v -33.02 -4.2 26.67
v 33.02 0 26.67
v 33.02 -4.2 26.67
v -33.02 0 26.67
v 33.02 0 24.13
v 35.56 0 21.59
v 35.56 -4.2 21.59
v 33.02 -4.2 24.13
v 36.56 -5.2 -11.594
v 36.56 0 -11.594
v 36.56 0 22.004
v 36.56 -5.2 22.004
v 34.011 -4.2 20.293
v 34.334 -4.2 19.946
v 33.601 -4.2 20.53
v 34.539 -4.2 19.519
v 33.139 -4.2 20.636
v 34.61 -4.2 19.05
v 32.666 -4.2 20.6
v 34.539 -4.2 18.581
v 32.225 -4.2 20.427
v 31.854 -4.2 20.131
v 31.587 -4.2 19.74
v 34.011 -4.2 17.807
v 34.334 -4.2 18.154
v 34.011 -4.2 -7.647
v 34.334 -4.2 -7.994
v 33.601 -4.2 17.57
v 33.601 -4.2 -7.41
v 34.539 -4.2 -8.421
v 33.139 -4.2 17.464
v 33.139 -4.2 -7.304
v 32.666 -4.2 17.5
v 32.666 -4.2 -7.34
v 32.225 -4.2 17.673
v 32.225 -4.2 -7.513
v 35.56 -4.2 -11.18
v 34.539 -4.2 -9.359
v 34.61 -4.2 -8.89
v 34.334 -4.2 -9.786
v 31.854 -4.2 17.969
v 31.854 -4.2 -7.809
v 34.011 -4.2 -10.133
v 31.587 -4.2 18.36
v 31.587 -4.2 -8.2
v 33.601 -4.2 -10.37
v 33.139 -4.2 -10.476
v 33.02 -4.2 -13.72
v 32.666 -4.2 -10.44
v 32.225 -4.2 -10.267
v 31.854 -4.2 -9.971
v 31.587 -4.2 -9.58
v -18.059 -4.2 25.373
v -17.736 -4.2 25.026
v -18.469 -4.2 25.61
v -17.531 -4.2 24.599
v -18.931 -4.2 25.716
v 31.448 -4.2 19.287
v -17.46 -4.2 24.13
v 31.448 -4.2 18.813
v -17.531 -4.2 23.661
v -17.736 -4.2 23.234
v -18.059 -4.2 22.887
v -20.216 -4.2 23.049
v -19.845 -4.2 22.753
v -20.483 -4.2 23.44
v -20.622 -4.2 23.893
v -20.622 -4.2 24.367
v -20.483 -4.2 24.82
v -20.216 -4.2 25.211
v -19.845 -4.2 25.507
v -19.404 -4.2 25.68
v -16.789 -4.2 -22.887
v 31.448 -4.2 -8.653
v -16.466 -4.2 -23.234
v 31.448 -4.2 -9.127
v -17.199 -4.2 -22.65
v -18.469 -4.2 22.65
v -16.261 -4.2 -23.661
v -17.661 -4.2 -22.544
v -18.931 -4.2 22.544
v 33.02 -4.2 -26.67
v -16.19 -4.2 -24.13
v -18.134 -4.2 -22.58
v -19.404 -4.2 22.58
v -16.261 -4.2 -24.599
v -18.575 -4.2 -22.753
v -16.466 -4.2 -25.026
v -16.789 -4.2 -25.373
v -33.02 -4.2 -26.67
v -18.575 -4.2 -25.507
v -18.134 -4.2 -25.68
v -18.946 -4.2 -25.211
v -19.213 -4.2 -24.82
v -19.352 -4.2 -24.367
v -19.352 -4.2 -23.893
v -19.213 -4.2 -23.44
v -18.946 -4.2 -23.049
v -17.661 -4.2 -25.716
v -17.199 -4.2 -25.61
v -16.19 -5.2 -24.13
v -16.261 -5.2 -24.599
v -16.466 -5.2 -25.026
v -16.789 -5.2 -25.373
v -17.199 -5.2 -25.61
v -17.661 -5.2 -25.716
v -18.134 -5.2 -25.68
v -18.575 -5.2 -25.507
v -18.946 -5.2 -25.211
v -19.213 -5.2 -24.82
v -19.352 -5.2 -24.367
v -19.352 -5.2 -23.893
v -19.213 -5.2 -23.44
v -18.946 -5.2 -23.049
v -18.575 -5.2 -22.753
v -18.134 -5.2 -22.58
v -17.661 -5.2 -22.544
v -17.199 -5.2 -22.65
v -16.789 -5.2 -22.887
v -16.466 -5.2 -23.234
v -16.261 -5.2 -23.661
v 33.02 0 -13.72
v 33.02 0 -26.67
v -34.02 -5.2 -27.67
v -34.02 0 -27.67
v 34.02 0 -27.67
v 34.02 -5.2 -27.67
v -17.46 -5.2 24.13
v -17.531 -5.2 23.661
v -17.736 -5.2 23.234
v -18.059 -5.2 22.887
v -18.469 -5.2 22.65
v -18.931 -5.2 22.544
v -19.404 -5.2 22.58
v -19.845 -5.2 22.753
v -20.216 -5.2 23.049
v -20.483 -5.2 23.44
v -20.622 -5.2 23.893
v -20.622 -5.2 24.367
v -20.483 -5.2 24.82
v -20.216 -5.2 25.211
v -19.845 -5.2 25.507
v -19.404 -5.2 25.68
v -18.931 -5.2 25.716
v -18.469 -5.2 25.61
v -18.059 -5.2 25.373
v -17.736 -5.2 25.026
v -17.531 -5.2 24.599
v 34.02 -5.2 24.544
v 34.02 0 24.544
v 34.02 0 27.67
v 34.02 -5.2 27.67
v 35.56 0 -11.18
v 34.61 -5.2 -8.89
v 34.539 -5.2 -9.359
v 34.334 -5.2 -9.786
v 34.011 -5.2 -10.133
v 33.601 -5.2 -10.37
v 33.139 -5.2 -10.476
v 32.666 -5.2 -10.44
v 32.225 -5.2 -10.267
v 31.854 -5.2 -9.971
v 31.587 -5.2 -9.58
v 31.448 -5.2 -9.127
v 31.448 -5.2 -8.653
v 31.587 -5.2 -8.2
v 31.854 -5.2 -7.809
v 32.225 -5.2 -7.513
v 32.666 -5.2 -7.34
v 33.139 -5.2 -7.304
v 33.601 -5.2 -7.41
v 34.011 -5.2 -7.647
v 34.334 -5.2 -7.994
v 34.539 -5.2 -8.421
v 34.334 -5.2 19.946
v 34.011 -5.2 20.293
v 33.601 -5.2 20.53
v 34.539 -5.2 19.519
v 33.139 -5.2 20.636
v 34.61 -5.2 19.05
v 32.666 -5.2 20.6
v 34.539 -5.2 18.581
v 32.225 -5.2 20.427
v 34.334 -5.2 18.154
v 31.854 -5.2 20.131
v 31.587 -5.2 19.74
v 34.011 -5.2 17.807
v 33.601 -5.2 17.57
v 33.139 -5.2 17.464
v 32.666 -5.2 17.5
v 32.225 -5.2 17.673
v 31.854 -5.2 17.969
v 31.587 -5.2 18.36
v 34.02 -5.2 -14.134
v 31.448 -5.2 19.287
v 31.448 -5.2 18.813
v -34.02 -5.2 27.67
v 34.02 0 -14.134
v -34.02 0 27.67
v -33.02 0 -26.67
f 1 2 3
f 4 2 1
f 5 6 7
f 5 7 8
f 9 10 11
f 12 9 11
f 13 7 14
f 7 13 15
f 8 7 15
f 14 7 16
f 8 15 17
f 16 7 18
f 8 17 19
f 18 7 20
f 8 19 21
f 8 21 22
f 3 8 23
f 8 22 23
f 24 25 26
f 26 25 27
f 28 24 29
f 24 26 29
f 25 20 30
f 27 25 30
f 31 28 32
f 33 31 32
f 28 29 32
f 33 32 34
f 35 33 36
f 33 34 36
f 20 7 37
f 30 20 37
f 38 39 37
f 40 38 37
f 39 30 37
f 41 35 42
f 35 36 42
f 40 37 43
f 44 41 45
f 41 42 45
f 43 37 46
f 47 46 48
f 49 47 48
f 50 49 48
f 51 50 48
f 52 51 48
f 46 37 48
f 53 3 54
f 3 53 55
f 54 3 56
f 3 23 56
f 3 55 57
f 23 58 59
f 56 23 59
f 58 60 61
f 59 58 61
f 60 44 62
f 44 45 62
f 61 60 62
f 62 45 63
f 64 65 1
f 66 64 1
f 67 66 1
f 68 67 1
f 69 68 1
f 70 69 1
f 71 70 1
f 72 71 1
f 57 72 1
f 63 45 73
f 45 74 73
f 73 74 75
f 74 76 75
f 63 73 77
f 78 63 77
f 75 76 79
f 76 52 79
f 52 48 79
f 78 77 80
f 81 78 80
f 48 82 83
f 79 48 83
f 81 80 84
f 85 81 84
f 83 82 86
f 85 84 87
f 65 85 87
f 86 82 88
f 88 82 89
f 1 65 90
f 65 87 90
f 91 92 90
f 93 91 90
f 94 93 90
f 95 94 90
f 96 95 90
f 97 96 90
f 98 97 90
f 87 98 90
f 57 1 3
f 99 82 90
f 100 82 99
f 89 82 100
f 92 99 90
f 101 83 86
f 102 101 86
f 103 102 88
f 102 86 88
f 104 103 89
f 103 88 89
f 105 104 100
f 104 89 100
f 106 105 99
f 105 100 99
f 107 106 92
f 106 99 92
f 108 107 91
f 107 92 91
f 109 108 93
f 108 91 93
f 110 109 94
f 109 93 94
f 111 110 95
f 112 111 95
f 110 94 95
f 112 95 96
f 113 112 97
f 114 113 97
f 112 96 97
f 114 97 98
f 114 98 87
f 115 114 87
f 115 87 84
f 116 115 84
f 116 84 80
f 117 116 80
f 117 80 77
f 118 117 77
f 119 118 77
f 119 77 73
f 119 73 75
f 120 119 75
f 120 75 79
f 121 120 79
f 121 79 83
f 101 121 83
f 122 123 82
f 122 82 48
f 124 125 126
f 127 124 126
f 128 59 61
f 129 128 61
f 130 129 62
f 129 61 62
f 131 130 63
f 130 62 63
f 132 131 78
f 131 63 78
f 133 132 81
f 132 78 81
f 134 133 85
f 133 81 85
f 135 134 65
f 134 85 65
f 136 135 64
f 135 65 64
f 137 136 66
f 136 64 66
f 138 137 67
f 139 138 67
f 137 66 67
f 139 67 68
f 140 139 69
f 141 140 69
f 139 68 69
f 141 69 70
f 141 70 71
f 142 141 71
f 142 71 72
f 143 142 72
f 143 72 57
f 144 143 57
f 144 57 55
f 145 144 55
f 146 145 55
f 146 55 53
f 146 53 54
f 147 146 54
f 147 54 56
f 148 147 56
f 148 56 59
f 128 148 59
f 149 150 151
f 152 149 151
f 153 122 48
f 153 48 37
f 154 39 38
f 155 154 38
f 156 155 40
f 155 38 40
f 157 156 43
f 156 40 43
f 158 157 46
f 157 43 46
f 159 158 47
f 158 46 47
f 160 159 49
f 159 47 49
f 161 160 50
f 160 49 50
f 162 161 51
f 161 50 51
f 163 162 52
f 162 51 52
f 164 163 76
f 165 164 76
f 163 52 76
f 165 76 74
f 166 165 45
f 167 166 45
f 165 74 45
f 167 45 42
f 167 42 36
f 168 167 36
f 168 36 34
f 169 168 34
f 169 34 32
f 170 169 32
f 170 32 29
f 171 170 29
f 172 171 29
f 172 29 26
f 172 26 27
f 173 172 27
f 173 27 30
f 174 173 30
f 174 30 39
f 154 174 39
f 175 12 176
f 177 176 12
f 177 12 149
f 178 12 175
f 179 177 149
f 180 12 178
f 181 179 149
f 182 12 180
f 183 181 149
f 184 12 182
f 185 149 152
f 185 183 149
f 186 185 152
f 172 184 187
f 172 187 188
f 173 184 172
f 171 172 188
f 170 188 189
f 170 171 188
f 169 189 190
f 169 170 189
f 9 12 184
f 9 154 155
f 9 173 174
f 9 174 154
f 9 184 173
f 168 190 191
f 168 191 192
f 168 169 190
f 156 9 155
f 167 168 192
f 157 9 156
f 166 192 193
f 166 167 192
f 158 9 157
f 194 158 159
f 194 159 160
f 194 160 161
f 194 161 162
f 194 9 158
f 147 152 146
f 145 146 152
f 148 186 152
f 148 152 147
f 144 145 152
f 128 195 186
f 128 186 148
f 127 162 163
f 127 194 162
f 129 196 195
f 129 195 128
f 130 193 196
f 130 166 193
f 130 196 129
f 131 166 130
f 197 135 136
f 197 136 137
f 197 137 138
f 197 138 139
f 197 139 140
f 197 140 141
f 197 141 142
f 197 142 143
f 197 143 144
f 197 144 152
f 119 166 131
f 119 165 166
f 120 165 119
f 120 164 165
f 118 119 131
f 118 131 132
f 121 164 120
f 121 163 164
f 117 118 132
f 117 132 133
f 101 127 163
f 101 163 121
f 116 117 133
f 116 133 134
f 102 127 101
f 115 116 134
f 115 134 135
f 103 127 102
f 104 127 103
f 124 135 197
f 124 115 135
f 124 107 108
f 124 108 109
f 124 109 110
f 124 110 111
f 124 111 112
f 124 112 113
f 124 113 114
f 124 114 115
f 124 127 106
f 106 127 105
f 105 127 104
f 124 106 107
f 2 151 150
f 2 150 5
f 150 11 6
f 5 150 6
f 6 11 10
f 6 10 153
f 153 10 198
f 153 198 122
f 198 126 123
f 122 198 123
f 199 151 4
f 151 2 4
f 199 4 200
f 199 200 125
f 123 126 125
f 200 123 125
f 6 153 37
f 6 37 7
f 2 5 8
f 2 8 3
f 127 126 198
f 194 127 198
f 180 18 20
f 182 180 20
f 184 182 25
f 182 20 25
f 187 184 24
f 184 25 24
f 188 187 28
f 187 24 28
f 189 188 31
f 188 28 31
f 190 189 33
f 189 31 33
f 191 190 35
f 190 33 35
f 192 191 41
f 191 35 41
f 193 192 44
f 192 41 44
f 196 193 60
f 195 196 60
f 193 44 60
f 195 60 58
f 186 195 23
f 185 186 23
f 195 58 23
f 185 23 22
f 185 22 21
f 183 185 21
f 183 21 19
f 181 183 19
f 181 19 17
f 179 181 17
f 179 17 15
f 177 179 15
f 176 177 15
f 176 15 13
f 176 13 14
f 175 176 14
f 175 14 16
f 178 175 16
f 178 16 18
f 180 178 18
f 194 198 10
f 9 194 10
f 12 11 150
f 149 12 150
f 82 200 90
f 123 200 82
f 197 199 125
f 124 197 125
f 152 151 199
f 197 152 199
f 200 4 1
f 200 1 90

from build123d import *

# Parameters (mm, degrees)
SKETCH1_R           = 1.59
BOSS_EXTRUDE1_DEPTH = 5.2
SKETCH1_5_R         = 1.59
CUT_EXTRUDE2_DEPTH  = 4.2


with BuildPart() as part:
    # Sketch1 → Boss-Extrude1 (new body)
    with BuildSketch(Plane(origin=(0, 0, 0), x_dir=(1, 0, 0), z_dir=(0, 1, 0))):
        Polygon((36.56, 11.594213562), (34.02, 14.134213562), (34.02, 27.67), (-34.02, 27.67), (-34.02, -27.67), (34.02, -27.67), (34.02, -24.544213562), (36.56, -22.004213562), align=None)
        with Locations((-19.05, -24.13)):
            Circle(SKETCH1_R, mode=Mode.SUBTRACT)
        with Locations((33.02, -19.05)):
            Circle(SKETCH1_R, mode=Mode.SUBTRACT)
        with Locations((-17.78, 24.13)):
            Circle(SKETCH1_R, mode=Mode.SUBTRACT)
        with Locations((33.02, 8.89)):
            Circle(SKETCH1_R, mode=Mode.SUBTRACT)
    extrude(amount=-BOSS_EXTRUDE1_DEPTH)

    # Sketch1<5> → Cut-Extrude2 (cut)
    with BuildSketch(Plane(origin=(0, 0, 0), x_dir=(1, 0, 0), z_dir=(0, 1, 0))):
        Polygon((-33.02, -26.67), (33.02, -26.67), (33.02, -24.13), (35.56, -21.59), (35.56, 11.18), (33.02, 13.72), (33.02, 26.67), (-33.02, 26.67), align=None)
        with Locations((-19.05, -24.13)):
            Circle(SKETCH1_5_R, mode=Mode.SUBTRACT)
        with Locations((33.02, -19.05)):
            Circle(SKETCH1_5_R, mode=Mode.SUBTRACT)
        with Locations((-17.78, 24.13)):
            Circle(SKETCH1_5_R, mode=Mode.SUBTRACT)
        with Locations((33.02, 8.89)):
            Circle(SKETCH1_5_R, mode=Mode.SUBTRACT)
    extrude(amount=-CUT_EXTRUDE2_DEPTH, mode=Mode.SUBTRACT)


solid = part.part
